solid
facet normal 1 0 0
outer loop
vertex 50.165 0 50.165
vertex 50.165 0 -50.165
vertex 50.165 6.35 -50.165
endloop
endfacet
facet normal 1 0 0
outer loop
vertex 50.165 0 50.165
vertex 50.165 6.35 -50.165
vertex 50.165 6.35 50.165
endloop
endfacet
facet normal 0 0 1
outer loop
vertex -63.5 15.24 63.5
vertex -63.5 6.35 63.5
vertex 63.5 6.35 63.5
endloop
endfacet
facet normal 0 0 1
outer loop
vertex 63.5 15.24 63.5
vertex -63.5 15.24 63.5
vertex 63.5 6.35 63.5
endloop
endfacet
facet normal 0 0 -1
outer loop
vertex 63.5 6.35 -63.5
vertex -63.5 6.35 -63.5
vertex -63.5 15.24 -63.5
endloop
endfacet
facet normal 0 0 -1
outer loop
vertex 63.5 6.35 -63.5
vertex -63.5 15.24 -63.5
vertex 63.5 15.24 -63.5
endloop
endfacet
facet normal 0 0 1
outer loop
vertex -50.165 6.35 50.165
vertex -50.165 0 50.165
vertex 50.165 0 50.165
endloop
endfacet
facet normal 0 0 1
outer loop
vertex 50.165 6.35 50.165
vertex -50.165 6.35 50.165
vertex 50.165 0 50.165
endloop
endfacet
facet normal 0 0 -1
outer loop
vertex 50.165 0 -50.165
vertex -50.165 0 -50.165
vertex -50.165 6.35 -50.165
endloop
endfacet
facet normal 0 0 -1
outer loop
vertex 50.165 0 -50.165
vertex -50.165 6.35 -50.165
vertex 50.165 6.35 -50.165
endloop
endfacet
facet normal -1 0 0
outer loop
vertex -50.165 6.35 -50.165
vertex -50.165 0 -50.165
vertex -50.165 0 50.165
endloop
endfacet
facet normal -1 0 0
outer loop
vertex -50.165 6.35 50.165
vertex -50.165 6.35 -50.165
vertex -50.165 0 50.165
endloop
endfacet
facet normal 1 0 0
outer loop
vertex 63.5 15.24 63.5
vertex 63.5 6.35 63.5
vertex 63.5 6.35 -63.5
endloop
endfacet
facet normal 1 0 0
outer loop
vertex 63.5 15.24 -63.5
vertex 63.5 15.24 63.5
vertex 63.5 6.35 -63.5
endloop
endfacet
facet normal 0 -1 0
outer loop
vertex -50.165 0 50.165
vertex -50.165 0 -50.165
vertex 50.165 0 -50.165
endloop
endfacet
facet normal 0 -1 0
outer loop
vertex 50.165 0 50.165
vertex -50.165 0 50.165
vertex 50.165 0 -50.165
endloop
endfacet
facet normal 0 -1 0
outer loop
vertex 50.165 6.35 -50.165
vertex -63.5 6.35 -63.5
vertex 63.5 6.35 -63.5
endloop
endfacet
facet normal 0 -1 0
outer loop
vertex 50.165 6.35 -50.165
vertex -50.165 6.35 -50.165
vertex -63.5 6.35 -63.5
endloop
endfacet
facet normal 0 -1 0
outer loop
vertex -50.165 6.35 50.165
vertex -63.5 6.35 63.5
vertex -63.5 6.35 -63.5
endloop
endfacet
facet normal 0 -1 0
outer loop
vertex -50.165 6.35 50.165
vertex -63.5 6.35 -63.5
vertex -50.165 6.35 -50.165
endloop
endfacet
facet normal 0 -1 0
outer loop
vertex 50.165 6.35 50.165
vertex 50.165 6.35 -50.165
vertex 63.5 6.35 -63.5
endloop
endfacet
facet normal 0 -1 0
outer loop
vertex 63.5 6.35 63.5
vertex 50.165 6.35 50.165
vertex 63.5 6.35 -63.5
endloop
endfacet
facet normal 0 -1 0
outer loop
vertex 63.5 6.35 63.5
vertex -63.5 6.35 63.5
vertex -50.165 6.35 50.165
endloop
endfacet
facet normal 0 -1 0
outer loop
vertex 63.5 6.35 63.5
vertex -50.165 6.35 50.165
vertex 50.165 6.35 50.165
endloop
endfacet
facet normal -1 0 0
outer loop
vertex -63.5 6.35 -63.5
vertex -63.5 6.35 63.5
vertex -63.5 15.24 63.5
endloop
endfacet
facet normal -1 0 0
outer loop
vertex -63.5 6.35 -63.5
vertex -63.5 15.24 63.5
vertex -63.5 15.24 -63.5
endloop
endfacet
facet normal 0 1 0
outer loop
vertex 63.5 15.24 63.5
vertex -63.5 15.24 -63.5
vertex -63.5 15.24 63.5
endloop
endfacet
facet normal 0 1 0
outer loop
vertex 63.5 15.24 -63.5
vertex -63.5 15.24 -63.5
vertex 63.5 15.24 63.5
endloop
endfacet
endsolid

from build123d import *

# Parameters (mm, degrees)
SKETCH1_W           = 127
SKETCH1_H           = 127
BOSS_EXTRUDE1_DEPTH = 15.24
SKETCH2_W           = 127
SKETCH2_H           = 127
SKETCH2_W_2         = 100.33
SKETCH2_H_2         = 100.33
CUT_EXTRUDE1_DEPTH  = 6.35


with BuildPart() as part:
    # Sketch1 → Boss-Extrude1 (new body)
    with BuildSketch(Plane(origin=(0, 0, 0), x_dir=(1, 0, 0), z_dir=(0, 1, 0))):
        Rectangle(SKETCH1_W, SKETCH1_H)
    extrude(amount=BOSS_EXTRUDE1_DEPTH)

    # Sketch2 → Cut-Extrude1 (cut)
    with BuildSketch(Plane.XZ):
        Rectangle(SKETCH2_W, SKETCH2_H)
        Rectangle(SKETCH2_W_2, SKETCH2_H_2, mode=Mode.SUBTRACT)
    extrude(amount=-CUT_EXTRUDE1_DEPTH, mode=Mode.SUBTRACT)


solid = part.part
